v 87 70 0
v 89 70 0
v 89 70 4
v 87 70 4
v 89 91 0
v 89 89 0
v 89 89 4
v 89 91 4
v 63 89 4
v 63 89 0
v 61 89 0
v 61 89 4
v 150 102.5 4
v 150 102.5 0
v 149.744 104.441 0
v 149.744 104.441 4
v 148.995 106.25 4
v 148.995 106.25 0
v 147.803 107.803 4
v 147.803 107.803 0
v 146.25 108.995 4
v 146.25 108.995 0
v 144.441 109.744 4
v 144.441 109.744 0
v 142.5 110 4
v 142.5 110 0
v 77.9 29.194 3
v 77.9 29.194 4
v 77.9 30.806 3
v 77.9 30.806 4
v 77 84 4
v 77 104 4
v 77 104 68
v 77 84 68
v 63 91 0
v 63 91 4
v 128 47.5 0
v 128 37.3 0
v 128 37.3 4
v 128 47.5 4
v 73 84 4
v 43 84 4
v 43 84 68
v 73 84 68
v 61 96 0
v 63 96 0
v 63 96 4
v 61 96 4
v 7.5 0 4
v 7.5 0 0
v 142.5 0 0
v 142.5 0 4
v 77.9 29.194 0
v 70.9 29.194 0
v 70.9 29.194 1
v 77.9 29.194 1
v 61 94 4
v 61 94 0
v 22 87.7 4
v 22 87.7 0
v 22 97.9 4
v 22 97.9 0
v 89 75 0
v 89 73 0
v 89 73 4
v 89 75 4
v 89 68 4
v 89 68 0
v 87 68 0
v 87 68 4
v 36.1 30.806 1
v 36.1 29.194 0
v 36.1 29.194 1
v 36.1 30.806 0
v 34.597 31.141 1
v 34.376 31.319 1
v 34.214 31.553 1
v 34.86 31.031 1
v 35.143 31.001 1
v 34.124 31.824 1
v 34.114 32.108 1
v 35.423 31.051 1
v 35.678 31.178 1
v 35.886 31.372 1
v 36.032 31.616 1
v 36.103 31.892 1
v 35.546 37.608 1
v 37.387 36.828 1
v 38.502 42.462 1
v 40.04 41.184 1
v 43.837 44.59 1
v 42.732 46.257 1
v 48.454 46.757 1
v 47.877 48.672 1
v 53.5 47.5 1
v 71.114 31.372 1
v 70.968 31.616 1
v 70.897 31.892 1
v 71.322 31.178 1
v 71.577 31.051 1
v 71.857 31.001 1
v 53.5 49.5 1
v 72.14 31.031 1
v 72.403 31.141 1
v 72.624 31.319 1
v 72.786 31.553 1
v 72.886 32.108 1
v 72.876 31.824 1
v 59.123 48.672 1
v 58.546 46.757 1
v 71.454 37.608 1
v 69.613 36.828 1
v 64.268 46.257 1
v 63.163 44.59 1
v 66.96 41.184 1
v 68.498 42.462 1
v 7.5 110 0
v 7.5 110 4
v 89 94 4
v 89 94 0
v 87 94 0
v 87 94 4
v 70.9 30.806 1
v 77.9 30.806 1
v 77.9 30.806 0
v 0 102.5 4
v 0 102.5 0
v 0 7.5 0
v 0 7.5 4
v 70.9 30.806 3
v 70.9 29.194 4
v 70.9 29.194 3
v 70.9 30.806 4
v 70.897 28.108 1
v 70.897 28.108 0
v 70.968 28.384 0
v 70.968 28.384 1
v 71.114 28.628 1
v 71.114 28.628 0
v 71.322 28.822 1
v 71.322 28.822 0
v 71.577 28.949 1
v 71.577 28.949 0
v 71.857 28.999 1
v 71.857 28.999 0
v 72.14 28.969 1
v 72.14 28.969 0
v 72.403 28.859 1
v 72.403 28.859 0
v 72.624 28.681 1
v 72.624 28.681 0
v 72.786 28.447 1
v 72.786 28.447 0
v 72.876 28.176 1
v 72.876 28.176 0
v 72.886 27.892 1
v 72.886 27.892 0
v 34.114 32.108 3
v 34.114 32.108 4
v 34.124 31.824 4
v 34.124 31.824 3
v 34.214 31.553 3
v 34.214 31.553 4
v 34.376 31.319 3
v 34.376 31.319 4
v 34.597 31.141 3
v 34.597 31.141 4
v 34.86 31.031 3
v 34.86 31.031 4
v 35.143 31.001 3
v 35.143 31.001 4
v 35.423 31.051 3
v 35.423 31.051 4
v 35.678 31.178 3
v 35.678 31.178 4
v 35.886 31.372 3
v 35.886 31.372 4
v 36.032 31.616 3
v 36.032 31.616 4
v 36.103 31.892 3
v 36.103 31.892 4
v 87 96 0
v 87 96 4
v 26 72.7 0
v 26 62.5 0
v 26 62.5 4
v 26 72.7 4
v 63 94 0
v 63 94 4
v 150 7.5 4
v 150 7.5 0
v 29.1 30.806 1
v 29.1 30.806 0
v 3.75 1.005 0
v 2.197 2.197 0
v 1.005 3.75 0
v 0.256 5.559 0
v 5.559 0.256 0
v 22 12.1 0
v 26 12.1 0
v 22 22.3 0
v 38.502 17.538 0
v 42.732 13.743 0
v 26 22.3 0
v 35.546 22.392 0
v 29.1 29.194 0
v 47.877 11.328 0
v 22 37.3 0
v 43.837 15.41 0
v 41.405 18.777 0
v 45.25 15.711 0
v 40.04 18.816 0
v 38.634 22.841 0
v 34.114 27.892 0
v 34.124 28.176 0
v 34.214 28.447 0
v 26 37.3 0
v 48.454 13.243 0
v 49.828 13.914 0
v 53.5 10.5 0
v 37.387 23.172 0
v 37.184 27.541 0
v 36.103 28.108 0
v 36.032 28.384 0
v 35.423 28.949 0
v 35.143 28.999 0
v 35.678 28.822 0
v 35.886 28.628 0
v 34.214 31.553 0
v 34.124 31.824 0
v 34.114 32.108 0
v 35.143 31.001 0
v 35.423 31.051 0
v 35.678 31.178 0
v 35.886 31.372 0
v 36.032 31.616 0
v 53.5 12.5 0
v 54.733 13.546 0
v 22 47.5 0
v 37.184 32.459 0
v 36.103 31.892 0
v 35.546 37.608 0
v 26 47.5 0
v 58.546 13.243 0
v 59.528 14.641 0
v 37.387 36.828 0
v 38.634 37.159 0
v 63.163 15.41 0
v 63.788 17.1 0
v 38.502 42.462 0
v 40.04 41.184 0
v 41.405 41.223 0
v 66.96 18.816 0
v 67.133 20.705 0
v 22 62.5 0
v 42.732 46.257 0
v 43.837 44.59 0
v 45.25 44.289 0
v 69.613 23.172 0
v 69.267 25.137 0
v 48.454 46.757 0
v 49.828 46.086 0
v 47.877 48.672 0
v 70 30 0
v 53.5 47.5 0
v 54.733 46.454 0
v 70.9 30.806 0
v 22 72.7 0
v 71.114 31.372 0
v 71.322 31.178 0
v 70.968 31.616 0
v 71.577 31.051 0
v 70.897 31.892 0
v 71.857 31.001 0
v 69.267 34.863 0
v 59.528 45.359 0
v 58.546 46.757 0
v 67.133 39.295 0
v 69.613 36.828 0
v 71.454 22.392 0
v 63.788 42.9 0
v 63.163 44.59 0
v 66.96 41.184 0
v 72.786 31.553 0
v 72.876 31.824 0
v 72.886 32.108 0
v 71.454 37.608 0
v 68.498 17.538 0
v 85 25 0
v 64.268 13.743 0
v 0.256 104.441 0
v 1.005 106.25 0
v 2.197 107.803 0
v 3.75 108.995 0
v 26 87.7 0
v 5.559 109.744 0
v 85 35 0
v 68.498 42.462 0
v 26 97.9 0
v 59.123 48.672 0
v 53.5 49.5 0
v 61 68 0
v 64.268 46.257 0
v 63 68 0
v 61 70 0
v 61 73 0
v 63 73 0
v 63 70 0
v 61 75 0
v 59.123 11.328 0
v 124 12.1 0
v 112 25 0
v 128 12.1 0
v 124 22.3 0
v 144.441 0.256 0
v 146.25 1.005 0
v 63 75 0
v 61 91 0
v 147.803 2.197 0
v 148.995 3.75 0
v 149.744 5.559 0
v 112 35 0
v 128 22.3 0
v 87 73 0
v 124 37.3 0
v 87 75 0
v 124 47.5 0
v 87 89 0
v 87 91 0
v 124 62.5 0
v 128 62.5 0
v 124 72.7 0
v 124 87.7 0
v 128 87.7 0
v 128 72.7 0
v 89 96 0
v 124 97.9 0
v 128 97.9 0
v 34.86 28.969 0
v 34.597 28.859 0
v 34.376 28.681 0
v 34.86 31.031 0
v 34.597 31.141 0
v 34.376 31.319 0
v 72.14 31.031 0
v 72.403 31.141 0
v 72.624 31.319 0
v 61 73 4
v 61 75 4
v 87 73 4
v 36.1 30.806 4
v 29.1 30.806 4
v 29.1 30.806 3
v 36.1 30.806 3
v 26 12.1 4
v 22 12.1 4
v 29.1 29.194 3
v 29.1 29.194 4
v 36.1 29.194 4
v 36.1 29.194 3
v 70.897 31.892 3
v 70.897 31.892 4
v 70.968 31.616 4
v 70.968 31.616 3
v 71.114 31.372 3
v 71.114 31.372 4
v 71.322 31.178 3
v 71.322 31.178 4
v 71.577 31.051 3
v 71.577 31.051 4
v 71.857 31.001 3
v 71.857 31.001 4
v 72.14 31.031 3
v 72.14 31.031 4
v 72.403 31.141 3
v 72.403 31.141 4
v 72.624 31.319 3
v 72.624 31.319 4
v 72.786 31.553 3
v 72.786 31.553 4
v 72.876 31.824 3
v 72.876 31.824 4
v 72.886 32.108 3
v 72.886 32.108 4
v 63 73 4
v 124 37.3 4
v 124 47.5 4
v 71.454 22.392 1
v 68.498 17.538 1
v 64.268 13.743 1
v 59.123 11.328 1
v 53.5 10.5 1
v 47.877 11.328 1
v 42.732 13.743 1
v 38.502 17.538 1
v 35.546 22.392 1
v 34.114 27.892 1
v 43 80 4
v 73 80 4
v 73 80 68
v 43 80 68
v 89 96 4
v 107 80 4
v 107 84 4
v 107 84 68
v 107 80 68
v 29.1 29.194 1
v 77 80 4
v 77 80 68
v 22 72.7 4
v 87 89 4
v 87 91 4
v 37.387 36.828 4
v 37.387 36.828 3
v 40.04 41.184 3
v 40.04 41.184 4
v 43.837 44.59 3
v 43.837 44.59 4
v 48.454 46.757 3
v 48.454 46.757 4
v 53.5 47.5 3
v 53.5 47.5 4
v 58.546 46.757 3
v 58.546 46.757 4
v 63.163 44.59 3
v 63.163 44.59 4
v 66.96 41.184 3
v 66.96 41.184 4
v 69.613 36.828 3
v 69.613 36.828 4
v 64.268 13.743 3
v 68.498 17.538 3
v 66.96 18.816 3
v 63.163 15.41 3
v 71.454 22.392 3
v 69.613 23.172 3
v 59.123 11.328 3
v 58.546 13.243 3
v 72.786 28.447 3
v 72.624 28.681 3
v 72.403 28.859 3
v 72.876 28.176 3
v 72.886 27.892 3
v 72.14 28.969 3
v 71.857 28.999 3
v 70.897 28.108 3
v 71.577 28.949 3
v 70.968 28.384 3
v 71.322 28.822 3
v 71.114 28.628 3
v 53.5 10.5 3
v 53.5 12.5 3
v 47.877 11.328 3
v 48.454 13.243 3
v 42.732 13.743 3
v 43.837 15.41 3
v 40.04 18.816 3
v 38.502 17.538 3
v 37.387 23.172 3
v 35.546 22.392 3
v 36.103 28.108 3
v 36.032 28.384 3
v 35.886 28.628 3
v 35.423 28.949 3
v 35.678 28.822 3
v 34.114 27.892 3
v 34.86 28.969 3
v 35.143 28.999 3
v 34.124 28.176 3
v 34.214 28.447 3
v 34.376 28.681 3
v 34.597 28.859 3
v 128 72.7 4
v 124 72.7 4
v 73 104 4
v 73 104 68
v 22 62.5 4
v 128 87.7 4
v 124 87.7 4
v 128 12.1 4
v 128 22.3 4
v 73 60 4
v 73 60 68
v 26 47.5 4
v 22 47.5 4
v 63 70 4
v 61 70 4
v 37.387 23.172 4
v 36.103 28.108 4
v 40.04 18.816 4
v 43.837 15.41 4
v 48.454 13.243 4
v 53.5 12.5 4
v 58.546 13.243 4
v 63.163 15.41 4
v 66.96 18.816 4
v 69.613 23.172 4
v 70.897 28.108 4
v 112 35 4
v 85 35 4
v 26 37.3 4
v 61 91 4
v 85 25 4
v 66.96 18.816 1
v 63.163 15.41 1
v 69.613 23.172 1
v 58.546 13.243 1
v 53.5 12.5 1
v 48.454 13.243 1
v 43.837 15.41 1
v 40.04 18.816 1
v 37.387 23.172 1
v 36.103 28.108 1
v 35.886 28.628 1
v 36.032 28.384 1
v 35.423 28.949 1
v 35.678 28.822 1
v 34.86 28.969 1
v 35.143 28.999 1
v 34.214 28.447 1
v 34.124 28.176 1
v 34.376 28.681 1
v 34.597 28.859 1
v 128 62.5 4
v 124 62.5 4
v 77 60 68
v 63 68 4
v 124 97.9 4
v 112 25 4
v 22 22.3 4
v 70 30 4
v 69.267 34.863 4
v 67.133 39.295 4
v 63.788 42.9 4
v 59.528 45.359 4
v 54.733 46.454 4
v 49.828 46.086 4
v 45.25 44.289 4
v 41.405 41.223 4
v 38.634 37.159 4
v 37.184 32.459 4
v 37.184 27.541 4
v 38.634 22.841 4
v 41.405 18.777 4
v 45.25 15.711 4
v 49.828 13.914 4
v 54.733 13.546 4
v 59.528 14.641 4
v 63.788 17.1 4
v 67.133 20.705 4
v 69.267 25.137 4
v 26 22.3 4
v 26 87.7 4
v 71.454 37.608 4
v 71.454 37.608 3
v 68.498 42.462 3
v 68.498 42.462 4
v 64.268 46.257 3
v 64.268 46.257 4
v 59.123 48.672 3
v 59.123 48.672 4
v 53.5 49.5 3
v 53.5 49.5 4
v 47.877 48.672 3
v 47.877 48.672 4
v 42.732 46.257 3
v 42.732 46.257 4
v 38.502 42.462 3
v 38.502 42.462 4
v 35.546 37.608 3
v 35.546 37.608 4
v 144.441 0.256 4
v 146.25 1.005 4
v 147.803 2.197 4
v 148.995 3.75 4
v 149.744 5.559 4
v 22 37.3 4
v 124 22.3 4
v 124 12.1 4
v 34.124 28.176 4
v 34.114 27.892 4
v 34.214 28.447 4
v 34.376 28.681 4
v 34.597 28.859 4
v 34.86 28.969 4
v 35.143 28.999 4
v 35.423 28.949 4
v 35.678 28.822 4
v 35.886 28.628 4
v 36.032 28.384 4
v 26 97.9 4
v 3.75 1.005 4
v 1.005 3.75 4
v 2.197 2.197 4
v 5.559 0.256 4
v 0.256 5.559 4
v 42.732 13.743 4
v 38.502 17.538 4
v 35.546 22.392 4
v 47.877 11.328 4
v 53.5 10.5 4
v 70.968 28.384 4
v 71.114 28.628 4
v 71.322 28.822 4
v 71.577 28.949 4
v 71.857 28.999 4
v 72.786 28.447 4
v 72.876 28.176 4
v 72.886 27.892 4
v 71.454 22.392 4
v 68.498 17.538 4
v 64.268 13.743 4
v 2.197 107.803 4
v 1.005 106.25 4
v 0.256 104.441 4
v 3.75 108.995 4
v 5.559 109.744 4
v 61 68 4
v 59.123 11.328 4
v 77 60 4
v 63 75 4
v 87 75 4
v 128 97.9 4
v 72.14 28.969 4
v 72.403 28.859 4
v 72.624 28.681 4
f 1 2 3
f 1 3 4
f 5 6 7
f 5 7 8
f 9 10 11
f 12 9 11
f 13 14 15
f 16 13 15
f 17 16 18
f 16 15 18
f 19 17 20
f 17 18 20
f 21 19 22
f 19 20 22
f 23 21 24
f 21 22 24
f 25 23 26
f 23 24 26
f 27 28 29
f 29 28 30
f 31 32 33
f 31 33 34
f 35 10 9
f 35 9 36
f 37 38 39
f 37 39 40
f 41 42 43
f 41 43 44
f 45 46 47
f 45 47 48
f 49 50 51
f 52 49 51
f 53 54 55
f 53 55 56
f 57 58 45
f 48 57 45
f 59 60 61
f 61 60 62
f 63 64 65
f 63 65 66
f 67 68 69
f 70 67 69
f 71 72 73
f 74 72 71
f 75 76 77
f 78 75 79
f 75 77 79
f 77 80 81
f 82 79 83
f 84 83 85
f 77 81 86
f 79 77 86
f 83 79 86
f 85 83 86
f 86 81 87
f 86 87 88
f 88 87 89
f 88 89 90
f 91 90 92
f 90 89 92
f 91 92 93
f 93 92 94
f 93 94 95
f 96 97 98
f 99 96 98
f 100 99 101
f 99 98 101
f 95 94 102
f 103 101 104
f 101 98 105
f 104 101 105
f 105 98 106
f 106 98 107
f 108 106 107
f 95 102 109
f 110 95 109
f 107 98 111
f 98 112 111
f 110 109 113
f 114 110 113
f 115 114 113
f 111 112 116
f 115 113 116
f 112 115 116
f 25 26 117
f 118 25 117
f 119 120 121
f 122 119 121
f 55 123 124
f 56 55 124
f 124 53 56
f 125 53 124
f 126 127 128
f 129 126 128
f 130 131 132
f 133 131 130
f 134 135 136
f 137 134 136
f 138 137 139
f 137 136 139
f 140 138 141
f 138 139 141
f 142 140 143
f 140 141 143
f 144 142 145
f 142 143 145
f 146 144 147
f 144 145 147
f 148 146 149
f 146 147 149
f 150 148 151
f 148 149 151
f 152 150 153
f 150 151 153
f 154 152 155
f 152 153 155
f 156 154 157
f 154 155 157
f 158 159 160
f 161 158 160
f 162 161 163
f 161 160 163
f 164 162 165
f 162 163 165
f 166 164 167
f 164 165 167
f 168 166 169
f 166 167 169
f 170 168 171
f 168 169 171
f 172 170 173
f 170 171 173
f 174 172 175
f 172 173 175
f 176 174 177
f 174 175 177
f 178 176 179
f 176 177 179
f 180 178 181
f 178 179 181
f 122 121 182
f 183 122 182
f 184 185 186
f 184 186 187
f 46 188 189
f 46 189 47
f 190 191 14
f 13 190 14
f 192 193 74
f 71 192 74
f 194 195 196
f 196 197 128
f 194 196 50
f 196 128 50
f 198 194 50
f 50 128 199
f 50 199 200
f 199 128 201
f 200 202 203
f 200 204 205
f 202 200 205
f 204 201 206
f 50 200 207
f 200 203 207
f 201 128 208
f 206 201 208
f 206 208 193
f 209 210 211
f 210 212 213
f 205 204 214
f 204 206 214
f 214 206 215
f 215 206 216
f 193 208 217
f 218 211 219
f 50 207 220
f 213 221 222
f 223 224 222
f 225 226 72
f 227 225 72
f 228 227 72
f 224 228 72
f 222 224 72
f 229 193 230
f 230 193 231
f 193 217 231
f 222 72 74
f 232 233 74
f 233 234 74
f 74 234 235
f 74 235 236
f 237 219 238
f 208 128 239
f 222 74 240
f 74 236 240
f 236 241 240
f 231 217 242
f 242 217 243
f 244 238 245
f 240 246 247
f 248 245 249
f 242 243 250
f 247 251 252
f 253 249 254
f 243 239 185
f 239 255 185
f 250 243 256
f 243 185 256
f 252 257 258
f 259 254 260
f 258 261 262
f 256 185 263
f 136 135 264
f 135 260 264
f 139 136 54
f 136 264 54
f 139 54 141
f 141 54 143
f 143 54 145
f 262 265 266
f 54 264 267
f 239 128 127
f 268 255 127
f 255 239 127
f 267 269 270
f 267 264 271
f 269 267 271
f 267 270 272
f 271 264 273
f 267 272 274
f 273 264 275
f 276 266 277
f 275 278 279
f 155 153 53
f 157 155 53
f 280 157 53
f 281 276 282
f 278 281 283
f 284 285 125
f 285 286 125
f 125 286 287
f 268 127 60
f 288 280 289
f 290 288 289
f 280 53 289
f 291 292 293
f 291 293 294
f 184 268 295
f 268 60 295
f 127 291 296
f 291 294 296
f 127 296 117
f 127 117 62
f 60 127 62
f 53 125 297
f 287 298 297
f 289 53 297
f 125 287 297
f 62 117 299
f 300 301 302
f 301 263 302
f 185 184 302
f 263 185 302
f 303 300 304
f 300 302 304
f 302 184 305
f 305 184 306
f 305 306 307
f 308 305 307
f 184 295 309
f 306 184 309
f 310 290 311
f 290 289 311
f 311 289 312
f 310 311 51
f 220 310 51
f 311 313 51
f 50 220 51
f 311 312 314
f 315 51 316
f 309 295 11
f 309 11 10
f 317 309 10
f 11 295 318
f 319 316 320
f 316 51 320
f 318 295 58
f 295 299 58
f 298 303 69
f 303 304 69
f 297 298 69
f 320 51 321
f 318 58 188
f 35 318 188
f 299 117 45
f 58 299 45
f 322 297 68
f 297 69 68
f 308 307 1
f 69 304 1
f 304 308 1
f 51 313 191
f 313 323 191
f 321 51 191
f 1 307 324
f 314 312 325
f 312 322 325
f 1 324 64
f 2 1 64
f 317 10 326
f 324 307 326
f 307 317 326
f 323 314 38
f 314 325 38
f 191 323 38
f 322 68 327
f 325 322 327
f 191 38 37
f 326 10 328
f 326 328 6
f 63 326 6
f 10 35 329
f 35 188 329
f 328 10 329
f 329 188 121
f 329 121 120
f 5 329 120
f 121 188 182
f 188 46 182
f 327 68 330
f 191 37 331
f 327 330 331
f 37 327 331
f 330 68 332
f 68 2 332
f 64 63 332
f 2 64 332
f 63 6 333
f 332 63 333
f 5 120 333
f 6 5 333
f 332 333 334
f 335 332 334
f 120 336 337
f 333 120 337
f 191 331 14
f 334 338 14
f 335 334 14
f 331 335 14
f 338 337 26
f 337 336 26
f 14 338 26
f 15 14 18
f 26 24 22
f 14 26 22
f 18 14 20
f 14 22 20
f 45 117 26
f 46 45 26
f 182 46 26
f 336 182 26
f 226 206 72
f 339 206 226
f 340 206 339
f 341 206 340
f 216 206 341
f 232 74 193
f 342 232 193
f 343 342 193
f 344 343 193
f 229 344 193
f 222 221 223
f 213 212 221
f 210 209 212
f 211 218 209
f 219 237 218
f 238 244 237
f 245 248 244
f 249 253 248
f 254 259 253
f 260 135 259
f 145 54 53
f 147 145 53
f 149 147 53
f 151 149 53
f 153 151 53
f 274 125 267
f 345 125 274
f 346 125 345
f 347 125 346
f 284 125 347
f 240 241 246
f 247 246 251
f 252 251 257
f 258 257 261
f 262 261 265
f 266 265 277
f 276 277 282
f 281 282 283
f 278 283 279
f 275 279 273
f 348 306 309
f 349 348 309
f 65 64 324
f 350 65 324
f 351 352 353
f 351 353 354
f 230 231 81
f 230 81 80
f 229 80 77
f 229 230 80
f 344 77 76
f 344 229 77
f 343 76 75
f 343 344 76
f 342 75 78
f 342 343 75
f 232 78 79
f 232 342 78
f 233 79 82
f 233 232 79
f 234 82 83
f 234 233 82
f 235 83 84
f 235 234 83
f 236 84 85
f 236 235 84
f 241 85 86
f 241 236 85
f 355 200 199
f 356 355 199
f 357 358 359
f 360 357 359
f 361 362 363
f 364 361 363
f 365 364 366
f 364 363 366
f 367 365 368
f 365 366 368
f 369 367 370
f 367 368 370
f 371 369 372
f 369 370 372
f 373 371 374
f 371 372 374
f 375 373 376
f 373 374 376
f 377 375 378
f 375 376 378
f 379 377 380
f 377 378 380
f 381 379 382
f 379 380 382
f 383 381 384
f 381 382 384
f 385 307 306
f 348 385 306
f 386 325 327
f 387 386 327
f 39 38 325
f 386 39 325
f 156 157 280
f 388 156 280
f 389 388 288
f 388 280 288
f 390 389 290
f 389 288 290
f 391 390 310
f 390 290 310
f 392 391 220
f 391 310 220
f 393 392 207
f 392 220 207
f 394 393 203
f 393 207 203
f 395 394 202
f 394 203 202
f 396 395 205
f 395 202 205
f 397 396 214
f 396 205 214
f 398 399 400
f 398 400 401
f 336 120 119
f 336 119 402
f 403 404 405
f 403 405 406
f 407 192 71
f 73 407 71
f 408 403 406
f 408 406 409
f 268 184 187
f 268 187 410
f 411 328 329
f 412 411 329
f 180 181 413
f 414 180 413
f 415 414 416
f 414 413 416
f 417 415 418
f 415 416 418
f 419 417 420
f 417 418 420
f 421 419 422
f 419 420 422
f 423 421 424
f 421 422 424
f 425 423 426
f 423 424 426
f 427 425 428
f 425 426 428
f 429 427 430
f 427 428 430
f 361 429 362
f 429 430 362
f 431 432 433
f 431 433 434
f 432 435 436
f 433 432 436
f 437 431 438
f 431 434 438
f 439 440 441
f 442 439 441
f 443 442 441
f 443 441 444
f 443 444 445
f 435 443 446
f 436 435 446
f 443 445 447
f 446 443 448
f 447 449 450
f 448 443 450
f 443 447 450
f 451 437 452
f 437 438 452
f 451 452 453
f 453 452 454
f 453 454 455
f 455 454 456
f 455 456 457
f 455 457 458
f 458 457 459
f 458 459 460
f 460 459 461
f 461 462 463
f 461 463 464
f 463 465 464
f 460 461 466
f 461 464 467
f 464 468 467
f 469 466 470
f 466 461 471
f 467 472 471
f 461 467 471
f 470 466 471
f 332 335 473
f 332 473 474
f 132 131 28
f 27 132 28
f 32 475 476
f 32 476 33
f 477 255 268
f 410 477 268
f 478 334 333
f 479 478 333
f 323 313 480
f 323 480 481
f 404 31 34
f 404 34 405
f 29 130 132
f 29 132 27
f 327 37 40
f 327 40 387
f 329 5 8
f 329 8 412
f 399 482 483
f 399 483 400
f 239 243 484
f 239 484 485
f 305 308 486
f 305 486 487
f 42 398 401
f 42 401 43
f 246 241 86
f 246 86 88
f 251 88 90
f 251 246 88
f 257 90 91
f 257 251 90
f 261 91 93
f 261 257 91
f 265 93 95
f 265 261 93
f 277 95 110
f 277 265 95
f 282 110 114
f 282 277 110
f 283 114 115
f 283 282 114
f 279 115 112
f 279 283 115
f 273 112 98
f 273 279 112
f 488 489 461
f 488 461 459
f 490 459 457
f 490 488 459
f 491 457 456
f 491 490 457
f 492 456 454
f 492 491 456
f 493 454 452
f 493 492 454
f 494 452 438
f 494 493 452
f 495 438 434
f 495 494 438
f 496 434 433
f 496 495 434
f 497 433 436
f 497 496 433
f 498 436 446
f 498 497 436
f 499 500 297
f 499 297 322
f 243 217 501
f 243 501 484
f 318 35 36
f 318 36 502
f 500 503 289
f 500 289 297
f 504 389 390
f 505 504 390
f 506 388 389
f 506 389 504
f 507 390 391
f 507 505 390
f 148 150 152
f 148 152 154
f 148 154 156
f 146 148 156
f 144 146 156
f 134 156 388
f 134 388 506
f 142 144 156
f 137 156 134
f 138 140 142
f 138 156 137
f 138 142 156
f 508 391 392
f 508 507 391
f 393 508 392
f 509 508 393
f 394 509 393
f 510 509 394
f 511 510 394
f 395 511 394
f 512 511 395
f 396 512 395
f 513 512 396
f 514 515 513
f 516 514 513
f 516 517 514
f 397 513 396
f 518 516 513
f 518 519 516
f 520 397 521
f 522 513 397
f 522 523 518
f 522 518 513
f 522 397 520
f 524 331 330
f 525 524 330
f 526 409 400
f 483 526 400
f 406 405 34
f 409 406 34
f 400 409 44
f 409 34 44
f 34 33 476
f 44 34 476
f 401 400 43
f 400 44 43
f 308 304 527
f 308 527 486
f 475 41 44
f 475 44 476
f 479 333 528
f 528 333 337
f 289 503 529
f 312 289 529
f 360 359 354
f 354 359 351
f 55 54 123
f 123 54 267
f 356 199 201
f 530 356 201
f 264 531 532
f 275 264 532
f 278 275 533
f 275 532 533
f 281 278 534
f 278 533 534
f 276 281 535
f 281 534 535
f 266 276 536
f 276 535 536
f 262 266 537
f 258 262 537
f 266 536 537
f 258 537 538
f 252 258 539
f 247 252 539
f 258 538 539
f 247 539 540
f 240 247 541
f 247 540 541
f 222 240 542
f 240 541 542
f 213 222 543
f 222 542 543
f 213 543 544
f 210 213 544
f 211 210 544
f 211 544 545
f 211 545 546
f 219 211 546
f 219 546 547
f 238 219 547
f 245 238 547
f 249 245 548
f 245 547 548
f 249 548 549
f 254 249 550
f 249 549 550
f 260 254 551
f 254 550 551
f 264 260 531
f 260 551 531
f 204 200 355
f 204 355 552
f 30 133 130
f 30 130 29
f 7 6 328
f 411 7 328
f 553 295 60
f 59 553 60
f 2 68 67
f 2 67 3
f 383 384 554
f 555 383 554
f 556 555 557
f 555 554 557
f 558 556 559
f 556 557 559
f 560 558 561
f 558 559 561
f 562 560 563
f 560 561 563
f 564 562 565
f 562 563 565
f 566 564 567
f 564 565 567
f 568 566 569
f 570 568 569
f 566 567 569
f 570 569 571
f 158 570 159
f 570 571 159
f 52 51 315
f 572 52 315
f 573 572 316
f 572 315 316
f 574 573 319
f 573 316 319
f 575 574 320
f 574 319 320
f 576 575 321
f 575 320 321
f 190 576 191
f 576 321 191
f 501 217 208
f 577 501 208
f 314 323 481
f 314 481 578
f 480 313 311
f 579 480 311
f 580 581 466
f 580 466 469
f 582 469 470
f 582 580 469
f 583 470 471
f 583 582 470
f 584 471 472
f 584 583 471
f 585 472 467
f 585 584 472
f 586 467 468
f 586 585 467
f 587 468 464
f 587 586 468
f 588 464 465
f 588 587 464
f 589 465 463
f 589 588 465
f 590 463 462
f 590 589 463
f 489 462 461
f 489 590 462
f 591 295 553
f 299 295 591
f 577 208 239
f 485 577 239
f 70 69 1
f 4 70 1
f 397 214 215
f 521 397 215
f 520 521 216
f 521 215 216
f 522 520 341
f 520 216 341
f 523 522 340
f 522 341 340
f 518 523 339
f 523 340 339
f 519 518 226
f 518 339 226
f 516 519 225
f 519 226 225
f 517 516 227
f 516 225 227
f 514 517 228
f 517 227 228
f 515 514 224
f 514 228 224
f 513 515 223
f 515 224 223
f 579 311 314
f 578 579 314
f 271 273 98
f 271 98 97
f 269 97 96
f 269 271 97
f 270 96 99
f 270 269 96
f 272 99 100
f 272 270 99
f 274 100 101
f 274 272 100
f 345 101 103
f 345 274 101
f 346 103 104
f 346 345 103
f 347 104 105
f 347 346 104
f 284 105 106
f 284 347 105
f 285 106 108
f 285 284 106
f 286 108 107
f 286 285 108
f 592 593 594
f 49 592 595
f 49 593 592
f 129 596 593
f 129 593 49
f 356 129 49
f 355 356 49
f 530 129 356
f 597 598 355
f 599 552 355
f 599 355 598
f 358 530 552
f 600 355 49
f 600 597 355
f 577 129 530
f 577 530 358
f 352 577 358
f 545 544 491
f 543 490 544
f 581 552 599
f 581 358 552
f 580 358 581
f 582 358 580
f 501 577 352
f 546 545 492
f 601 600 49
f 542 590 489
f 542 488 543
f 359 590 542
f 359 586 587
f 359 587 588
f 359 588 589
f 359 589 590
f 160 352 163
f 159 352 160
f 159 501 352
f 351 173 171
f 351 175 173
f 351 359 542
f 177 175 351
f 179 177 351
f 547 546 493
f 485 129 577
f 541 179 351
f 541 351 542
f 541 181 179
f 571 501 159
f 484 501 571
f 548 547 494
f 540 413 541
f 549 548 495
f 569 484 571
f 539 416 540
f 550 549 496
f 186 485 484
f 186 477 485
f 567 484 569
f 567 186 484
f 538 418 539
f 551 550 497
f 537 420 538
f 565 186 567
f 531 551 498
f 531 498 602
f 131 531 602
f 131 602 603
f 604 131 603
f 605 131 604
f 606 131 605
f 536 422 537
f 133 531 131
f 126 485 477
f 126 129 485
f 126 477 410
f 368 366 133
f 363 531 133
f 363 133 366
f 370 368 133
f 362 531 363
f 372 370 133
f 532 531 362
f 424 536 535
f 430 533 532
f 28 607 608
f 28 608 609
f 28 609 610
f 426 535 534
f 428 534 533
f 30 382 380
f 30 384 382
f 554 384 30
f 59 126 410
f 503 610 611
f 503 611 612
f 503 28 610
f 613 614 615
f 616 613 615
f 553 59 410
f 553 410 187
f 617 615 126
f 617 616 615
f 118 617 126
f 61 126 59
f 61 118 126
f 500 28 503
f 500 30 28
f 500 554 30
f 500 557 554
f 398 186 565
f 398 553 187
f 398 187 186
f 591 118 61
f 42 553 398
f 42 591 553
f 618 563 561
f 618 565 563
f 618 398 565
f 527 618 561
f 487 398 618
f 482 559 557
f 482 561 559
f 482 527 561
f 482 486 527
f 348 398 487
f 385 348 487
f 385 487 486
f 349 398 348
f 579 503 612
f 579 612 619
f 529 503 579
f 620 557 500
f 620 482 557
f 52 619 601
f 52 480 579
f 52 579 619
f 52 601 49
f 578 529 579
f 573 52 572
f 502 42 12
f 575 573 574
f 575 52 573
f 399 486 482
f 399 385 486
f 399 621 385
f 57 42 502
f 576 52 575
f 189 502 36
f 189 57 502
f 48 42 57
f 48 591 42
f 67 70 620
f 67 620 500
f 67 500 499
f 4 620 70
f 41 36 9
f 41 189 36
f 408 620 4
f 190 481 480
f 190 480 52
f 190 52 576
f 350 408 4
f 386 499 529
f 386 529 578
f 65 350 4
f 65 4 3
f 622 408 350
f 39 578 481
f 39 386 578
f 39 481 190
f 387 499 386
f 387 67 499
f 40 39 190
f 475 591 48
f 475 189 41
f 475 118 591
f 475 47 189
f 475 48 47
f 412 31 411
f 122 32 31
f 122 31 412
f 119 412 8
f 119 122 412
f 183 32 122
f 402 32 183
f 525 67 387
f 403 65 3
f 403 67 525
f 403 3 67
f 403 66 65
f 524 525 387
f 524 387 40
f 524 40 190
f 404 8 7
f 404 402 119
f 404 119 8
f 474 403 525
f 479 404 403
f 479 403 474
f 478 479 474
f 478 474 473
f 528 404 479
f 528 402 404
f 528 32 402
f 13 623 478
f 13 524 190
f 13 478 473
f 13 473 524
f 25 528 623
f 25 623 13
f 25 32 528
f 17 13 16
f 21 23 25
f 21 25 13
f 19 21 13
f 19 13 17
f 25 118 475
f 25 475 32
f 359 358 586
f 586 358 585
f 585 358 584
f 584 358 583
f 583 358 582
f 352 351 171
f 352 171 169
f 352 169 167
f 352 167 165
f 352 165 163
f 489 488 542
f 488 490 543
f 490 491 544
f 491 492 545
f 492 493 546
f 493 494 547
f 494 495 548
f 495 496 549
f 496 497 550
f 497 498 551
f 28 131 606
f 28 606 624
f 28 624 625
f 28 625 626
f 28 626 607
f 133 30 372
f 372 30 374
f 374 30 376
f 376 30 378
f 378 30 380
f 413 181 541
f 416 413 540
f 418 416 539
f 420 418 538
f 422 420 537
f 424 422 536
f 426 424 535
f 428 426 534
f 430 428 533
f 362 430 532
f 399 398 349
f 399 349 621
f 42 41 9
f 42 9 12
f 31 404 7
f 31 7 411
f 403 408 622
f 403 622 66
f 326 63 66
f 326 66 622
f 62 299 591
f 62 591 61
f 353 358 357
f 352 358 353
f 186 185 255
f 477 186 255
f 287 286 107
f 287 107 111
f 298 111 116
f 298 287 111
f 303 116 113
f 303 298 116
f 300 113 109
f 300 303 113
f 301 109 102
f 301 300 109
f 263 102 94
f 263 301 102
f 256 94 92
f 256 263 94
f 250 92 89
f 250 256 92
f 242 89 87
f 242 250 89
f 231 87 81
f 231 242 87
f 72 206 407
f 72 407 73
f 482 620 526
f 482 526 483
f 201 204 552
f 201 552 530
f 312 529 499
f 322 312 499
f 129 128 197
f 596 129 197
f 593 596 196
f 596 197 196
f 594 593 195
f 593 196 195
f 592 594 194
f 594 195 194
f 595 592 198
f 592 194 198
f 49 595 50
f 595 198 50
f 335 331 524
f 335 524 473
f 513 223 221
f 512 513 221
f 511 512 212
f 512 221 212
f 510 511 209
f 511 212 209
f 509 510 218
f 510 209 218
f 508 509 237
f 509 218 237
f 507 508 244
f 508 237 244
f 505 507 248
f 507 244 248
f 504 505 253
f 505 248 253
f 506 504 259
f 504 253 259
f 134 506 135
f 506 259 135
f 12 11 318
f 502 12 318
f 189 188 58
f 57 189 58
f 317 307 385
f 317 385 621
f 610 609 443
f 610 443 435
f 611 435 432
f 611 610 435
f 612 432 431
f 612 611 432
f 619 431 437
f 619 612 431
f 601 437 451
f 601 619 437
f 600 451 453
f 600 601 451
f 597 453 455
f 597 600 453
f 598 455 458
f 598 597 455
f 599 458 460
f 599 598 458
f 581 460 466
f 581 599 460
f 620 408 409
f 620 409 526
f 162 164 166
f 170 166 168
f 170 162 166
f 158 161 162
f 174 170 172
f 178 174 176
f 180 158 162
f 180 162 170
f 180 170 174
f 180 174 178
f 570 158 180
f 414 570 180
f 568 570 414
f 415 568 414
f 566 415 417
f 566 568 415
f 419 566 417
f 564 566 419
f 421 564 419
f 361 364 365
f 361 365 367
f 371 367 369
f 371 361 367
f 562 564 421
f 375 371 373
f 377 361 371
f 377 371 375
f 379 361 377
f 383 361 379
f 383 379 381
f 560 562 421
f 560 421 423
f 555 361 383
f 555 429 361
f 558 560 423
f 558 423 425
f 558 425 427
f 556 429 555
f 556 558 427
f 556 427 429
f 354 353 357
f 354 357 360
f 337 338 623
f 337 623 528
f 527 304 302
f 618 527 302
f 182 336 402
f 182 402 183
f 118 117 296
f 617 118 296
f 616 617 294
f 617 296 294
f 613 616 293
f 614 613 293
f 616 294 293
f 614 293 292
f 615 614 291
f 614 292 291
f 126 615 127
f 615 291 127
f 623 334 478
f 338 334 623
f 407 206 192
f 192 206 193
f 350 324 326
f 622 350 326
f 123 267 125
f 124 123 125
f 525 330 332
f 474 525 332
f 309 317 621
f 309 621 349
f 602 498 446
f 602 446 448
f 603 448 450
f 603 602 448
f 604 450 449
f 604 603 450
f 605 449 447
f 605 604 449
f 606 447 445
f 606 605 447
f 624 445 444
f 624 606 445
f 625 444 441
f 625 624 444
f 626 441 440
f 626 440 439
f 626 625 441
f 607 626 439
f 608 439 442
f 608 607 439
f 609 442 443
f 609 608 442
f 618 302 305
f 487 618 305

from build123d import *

# Parameters (mm, degrees)
SALIENTE_EXTRUIR1_DEPTH = 4
CROQUIS2_R              = 16.5
CROQUIS2_W              = 27
CROQUIS2_H              = 10
CORTAR_EXTRUIR1_DEPTH   = 4
SALIENTE_EXTRUIR2_DEPTH = 64
CORTAR_EXTRUIR2_REACH   = 200.05
CROQUIS5_W              = 4
CROQUIS5_H              = 10.2
CROQUIS5_W_2            = 2
CROQUIS5_H_2            = 2
CROQUIS6_W              = 7
CROQUIS6_H              = 1.611721712
CORTAR_EXTRUIR3_DEPTH   = 1


with BuildPart() as part:
    # Croquis1 → Saliente-Extruir1 (new body)
    with BuildSketch(Plane.XY):
        with BuildLine():
            Line((7.5, 0), (142.5, 0))
            ThreePointArc((142.5, 0), (147.803300859, 2.196699141), (150, 7.5))
            Line((150, 7.5), (150, 102.5))
            ThreePointArc((150, 102.5), (147.803300859, 107.803300859), (142.5, 110))
            Line((142.5, 110), (7.5, 110))
            ThreePointArc((7.5, 110), (2.196699141, 107.803300859), (0, 102.5))
            Line((0, 102.5), (0, 7.5))
            ThreePointArc((0, 7.5), (2.196699141, 2.196699141), (7.5, 0))
        make_face()
    extrude(amount=SALIENTE_EXTRUIR1_DEPTH)

    # Croquis2 → Cortar-Extruir1 (cut)
    with BuildSketch(Plane.XY.offset(4)):
        with Locations((53.5, 30)):
            Circle(CROQUIS2_R)
        with Locations((98.5, 30)):
            Rectangle(CROQUIS2_W, CROQUIS2_H)
    extrude(amount=-CORTAR_EXTRUIR1_DEPTH, mode=Mode.SUBTRACT)

    # Croquis4 → Saliente-Extruir2 (add)
    with BuildSketch(Plane.XY.offset(4)):
        Polygon((73, 60), (73, 80), (43, 80), (43, 84), (73, 84), (73, 104), (77, 104), (77, 84), (107, 84), (107, 80), (77, 80), (77, 60), align=None)
    extrude(amount=SALIENTE_EXTRUIR2_DEPTH)

    # Croquis5 → Cortar-Extruir2 (cut, up to next)
    with BuildSketch(Plane(origin=(0, 0, 0), x_dir=(-1, 0, 0), z_dir=(0, 0, -1)), mode=Mode.PRIVATE) as cortar_extruir2_sk1:
        with Locations((-126, 67.6)):
            Rectangle(CROQUIS5_W, CROQUIS5_H)
    cortar_extruir2_tool1 = extrude(cortar_extruir2_sk1.sketch, amount=-CORTAR_EXTRUIR2_REACH, mode=Mode.PRIVATE) & part.part
    # Croquis5 → Cortar-Extruir2 (cut, up to next)
    with BuildSketch(Plane(origin=(0, 0, 0), x_dir=(-1, 0, 0), z_dir=(0, 0, -1)), mode=Mode.PRIVATE) as cortar_extruir2_sk2:
        with Locations((-126, 42.4)):
            Rectangle(CROQUIS5_W, CROQUIS5_H)
    cortar_extruir2_tool2 = extrude(cortar_extruir2_sk2.sketch, amount=-CORTAR_EXTRUIR2_REACH, mode=Mode.PRIVATE) & part.part
    # Croquis5 → Cortar-Extruir2 (cut, up to next)
    with BuildSketch(Plane(origin=(0, 0, 0), x_dir=(-1, 0, 0), z_dir=(0, 0, -1)), mode=Mode.PRIVATE) as cortar_extruir2_sk3:
        with Locations((-126, 17.2)):
            Rectangle(CROQUIS5_W, CROQUIS5_H)
    cortar_extruir2_tool3 = extrude(cortar_extruir2_sk3.sketch, amount=-CORTAR_EXTRUIR2_REACH, mode=Mode.PRIVATE) & part.part
    # Croquis5 → Cortar-Extruir2 (cut, up to next)
    with BuildSketch(Plane(origin=(0, 0, 0), x_dir=(-1, 0, 0), z_dir=(0, 0, -1)), mode=Mode.PRIVATE) as cortar_extruir2_sk4:
        with Locations((-126, 92.8)):
            Rectangle(CROQUIS5_W, CROQUIS5_H)
    cortar_extruir2_tool4 = extrude(cortar_extruir2_sk4.sketch, amount=-CORTAR_EXTRUIR2_REACH, mode=Mode.PRIVATE) & part.part
    # Croquis5 → Cortar-Extruir2 (cut, up to next)
    with BuildSketch(Plane(origin=(0, 0, 0), x_dir=(-1, 0, 0), z_dir=(0, 0, -1)), mode=Mode.PRIVATE) as cortar_extruir2_sk5:
        with Locations((-24, 92.8)):
            Rectangle(CROQUIS5_W, CROQUIS5_H)
    cortar_extruir2_tool5 = extrude(cortar_extruir2_sk5.sketch, amount=-CORTAR_EXTRUIR2_REACH, mode=Mode.PRIVATE) & part.part
    # Croquis5 → Cortar-Extruir2 (cut, up to next)
    with BuildSketch(Plane(origin=(0, 0, 0), x_dir=(-1, 0, 0), z_dir=(0, 0, -1)), mode=Mode.PRIVATE) as cortar_extruir2_sk6:
        with Locations((-24, 67.6)):
            Rectangle(CROQUIS5_W, CROQUIS5_H)
    cortar_extruir2_tool6 = extrude(cortar_extruir2_sk6.sketch, amount=-CORTAR_EXTRUIR2_REACH, mode=Mode.PRIVATE) & part.part
    # Croquis5 → Cortar-Extruir2 (cut, up to next)
    with BuildSketch(Plane(origin=(0, 0, 0), x_dir=(-1, 0, 0), z_dir=(0, 0, -1)), mode=Mode.PRIVATE) as cortar_extruir2_sk7:
        with Locations((-24, 42.4)):
            Rectangle(CROQUIS5_W, CROQUIS5_H)
    cortar_extruir2_tool7 = extrude(cortar_extruir2_sk7.sketch, amount=-CORTAR_EXTRUIR2_REACH, mode=Mode.PRIVATE) & part.part
    # Croquis5 → Cortar-Extruir2 (cut, up to next)
    with BuildSketch(Plane(origin=(0, 0, 0), x_dir=(-1, 0, 0), z_dir=(0, 0, -1)), mode=Mode.PRIVATE) as cortar_extruir2_sk8:
        with Locations((-24, 17.2)):
            Rectangle(CROQUIS5_W, CROQUIS5_H)
    cortar_extruir2_tool8 = extrude(cortar_extruir2_sk8.sketch, amount=-CORTAR_EXTRUIR2_REACH, mode=Mode.PRIVATE) & part.part
    # Croquis5 → Cortar-Extruir2 (cut, up to next)
    with BuildSketch(Plane(origin=(0, 0, 0), x_dir=(-1, 0, 0), z_dir=(0, 0, -1)), mode=Mode.PRIVATE) as cortar_extruir2_sk9:
        with Locations((-88, 95)):
            Rectangle(CROQUIS5_W_2, CROQUIS5_H_2)
    cortar_extruir2_tool9 = extrude(cortar_extruir2_sk9.sketch, amount=-CORTAR_EXTRUIR2_REACH, mode=Mode.PRIVATE) & part.part
    # Croquis5 → Cortar-Extruir2 (cut, up to next)
    with BuildSketch(Plane(origin=(0, 0, 0), x_dir=(-1, 0, 0), z_dir=(0, 0, -1)), mode=Mode.PRIVATE) as cortar_extruir2_sk10:
        with Locations((-88, 90)):
            Rectangle(CROQUIS5_W_2, CROQUIS5_H_2)
    cortar_extruir2_tool10 = extrude(cortar_extruir2_sk10.sketch, amount=-CORTAR_EXTRUIR2_REACH, mode=Mode.PRIVATE) & part.part
    # Croquis5 → Cortar-Extruir2 (cut, up to next)
    with BuildSketch(Plane(origin=(0, 0, 0), x_dir=(-1, 0, 0), z_dir=(0, 0, -1)), mode=Mode.PRIVATE) as cortar_extruir2_sk11:
        with Locations((-62, 90)):
            Rectangle(CROQUIS5_W_2, CROQUIS5_H_2)
    cortar_extruir2_tool11 = extrude(cortar_extruir2_sk11.sketch, amount=-CORTAR_EXTRUIR2_REACH, mode=Mode.PRIVATE) & part.part
    # Croquis5 → Cortar-Extruir2 (cut, up to next)
    with BuildSketch(Plane(origin=(0, 0, 0), x_dir=(-1, 0, 0), z_dir=(0, 0, -1)), mode=Mode.PRIVATE) as cortar_extruir2_sk12:
        with Locations((-62, 95)):
            Rectangle(CROQUIS5_W_2, CROQUIS5_H_2)
    cortar_extruir2_tool12 = extrude(cortar_extruir2_sk12.sketch, amount=-CORTAR_EXTRUIR2_REACH, mode=Mode.PRIVATE) & part.part
    # Croquis5 → Cortar-Extruir2 (cut, up to next)
    with BuildSketch(Plane(origin=(0, 0, 0), x_dir=(-1, 0, 0), z_dir=(0, 0, -1)), mode=Mode.PRIVATE) as cortar_extruir2_sk13:
        with Locations((-88, 74)):
            Rectangle(CROQUIS5_W_2, CROQUIS5_H_2)
    cortar_extruir2_tool13 = extrude(cortar_extruir2_sk13.sketch, amount=-CORTAR_EXTRUIR2_REACH, mode=Mode.PRIVATE) & part.part
    # Croquis5 → Cortar-Extruir2 (cut, up to next)
    with BuildSketch(Plane(origin=(0, 0, 0), x_dir=(-1, 0, 0), z_dir=(0, 0, -1)), mode=Mode.PRIVATE) as cortar_extruir2_sk14:
        with Locations((-88, 69)):
            Rectangle(CROQUIS5_W_2, CROQUIS5_H_2)
    cortar_extruir2_tool14 = extrude(cortar_extruir2_sk14.sketch, amount=-CORTAR_EXTRUIR2_REACH, mode=Mode.PRIVATE) & part.part
    # Croquis5 → Cortar-Extruir2 (cut, up to next)
    with BuildSketch(Plane(origin=(0, 0, 0), x_dir=(-1, 0, 0), z_dir=(0, 0, -1)), mode=Mode.PRIVATE) as cortar_extruir2_sk15:
        with Locations((-62, 69)):
            Rectangle(CROQUIS5_W_2, CROQUIS5_H_2)
    cortar_extruir2_tool15 = extrude(cortar_extruir2_sk15.sketch, amount=-CORTAR_EXTRUIR2_REACH, mode=Mode.PRIVATE) & part.part
    # Croquis5 → Cortar-Extruir2 (cut, up to next)
    with BuildSketch(Plane(origin=(0, 0, 0), x_dir=(-1, 0, 0), z_dir=(0, 0, -1)), mode=Mode.PRIVATE) as cortar_extruir2_sk16:
        with Locations((-62, 74)):
            Rectangle(CROQUIS5_W_2, CROQUIS5_H_2)
    cortar_extruir2_tool16 = extrude(cortar_extruir2_sk16.sketch, amount=-CORTAR_EXTRUIR2_REACH, mode=Mode.PRIVATE) & part.part
    add(cortar_extruir2_tool1.solids().sort_by_distance((126, 67.6, 0))[0], mode=Mode.SUBTRACT)
    add(cortar_extruir2_tool2.solids().sort_by_distance((126, 42.4, 0))[0], mode=Mode.SUBTRACT)
    add(cortar_extruir2_tool3.solids().sort_by_distance((126, 17.2, 0))[0], mode=Mode.SUBTRACT)
    add(cortar_extruir2_tool4.solids().sort_by_distance((126, 92.8, 0))[0], mode=Mode.SUBTRACT)
    add(cortar_extruir2_tool5.solids().sort_by_distance((24, 92.8, 0))[0], mode=Mode.SUBTRACT)
    add(cortar_extruir2_tool6.solids().sort_by_distance((24, 67.6, 0))[0], mode=Mode.SUBTRACT)
    add(cortar_extruir2_tool7.solids().sort_by_distance((24, 42.4, 0))[0], mode=Mode.SUBTRACT)
    add(cortar_extruir2_tool8.solids().sort_by_distance((24, 17.2, 0))[0], mode=Mode.SUBTRACT)
    add(cortar_extruir2_tool9.solids().sort_by_distance((88, 95, 0))[0], mode=Mode.SUBTRACT)
    add(cortar_extruir2_tool10.solids().sort_by_distance((88, 90, 0))[0], mode=Mode.SUBTRACT)
    add(cortar_extruir2_tool11.solids().sort_by_distance((62, 90, 0))[0], mode=Mode.SUBTRACT)
    add(cortar_extruir2_tool12.solids().sort_by_distance((62, 95, 0))[0], mode=Mode.SUBTRACT)
    add(cortar_extruir2_tool13.solids().sort_by_distance((88, 74, 0))[0], mode=Mode.SUBTRACT)
    add(cortar_extruir2_tool14.solids().sort_by_distance((88, 69, 0))[0], mode=Mode.SUBTRACT)
    add(cortar_extruir2_tool15.solids().sort_by_distance((62, 69, 0))[0], mode=Mode.SUBTRACT)
    add(cortar_extruir2_tool16.solids().sort_by_distance((62, 74, 0))[0], mode=Mode.SUBTRACT)

    # Croquis6 → Cortar-Extruir3 (cut)
    with BuildSketch(Plane.XY.offset(4)):
        with Locations((74.4, 30)):
            Rectangle(CROQUIS6_W, CROQUIS6_H)
        with Locations((32.6, 30)):
            Rectangle(CROQUIS6_W, CROQUIS6_H)
        with BuildLine():
            ThreePointArc((72.885713301, 32.108108108), (53.5, 49.5), (34.114286699, 32.108108108))
            ThreePointArc((34.114286699, 32.108108108), (35.000317734, 31.005860856), (36.102564986, 31.891891892))
            ThreePointArc((36.102564986, 31.891891892), (53.5, 47.5), (70.897435014, 31.891891892))
            ThreePointArc((70.897435014, 31.891891892), (71.999682266, 31.005860856), (72.885713301, 32.108108108))
        make_face()
        with BuildLine():
            ThreePointArc((72.885713301, 27.891891892), (53.5, 10.5), (34.114286699, 27.891891892))
            ThreePointArc((34.114286699, 27.891891892), (35.000317734, 28.994139144), (36.102564986, 28.108108108))
            ThreePointArc((36.102564986, 28.108108108), (53.5, 12.5), (70.897435014, 28.108108108))
            ThreePointArc((70.897435014, 28.108108108), (71.999682266, 28.994139144), (72.885713301, 27.891891892))
        make_face()
    cortar_extruir3 = extrude(amount=-CORTAR_EXTRUIR3_DEPTH, mode=Mode.SUBTRACT)

    # Simetría1: Cortar-Extruir3 across plane
    add(cortar_extruir3.mirror(Plane.XY.offset(2)), mode=Mode.SUBTRACT)


solid = part.part
